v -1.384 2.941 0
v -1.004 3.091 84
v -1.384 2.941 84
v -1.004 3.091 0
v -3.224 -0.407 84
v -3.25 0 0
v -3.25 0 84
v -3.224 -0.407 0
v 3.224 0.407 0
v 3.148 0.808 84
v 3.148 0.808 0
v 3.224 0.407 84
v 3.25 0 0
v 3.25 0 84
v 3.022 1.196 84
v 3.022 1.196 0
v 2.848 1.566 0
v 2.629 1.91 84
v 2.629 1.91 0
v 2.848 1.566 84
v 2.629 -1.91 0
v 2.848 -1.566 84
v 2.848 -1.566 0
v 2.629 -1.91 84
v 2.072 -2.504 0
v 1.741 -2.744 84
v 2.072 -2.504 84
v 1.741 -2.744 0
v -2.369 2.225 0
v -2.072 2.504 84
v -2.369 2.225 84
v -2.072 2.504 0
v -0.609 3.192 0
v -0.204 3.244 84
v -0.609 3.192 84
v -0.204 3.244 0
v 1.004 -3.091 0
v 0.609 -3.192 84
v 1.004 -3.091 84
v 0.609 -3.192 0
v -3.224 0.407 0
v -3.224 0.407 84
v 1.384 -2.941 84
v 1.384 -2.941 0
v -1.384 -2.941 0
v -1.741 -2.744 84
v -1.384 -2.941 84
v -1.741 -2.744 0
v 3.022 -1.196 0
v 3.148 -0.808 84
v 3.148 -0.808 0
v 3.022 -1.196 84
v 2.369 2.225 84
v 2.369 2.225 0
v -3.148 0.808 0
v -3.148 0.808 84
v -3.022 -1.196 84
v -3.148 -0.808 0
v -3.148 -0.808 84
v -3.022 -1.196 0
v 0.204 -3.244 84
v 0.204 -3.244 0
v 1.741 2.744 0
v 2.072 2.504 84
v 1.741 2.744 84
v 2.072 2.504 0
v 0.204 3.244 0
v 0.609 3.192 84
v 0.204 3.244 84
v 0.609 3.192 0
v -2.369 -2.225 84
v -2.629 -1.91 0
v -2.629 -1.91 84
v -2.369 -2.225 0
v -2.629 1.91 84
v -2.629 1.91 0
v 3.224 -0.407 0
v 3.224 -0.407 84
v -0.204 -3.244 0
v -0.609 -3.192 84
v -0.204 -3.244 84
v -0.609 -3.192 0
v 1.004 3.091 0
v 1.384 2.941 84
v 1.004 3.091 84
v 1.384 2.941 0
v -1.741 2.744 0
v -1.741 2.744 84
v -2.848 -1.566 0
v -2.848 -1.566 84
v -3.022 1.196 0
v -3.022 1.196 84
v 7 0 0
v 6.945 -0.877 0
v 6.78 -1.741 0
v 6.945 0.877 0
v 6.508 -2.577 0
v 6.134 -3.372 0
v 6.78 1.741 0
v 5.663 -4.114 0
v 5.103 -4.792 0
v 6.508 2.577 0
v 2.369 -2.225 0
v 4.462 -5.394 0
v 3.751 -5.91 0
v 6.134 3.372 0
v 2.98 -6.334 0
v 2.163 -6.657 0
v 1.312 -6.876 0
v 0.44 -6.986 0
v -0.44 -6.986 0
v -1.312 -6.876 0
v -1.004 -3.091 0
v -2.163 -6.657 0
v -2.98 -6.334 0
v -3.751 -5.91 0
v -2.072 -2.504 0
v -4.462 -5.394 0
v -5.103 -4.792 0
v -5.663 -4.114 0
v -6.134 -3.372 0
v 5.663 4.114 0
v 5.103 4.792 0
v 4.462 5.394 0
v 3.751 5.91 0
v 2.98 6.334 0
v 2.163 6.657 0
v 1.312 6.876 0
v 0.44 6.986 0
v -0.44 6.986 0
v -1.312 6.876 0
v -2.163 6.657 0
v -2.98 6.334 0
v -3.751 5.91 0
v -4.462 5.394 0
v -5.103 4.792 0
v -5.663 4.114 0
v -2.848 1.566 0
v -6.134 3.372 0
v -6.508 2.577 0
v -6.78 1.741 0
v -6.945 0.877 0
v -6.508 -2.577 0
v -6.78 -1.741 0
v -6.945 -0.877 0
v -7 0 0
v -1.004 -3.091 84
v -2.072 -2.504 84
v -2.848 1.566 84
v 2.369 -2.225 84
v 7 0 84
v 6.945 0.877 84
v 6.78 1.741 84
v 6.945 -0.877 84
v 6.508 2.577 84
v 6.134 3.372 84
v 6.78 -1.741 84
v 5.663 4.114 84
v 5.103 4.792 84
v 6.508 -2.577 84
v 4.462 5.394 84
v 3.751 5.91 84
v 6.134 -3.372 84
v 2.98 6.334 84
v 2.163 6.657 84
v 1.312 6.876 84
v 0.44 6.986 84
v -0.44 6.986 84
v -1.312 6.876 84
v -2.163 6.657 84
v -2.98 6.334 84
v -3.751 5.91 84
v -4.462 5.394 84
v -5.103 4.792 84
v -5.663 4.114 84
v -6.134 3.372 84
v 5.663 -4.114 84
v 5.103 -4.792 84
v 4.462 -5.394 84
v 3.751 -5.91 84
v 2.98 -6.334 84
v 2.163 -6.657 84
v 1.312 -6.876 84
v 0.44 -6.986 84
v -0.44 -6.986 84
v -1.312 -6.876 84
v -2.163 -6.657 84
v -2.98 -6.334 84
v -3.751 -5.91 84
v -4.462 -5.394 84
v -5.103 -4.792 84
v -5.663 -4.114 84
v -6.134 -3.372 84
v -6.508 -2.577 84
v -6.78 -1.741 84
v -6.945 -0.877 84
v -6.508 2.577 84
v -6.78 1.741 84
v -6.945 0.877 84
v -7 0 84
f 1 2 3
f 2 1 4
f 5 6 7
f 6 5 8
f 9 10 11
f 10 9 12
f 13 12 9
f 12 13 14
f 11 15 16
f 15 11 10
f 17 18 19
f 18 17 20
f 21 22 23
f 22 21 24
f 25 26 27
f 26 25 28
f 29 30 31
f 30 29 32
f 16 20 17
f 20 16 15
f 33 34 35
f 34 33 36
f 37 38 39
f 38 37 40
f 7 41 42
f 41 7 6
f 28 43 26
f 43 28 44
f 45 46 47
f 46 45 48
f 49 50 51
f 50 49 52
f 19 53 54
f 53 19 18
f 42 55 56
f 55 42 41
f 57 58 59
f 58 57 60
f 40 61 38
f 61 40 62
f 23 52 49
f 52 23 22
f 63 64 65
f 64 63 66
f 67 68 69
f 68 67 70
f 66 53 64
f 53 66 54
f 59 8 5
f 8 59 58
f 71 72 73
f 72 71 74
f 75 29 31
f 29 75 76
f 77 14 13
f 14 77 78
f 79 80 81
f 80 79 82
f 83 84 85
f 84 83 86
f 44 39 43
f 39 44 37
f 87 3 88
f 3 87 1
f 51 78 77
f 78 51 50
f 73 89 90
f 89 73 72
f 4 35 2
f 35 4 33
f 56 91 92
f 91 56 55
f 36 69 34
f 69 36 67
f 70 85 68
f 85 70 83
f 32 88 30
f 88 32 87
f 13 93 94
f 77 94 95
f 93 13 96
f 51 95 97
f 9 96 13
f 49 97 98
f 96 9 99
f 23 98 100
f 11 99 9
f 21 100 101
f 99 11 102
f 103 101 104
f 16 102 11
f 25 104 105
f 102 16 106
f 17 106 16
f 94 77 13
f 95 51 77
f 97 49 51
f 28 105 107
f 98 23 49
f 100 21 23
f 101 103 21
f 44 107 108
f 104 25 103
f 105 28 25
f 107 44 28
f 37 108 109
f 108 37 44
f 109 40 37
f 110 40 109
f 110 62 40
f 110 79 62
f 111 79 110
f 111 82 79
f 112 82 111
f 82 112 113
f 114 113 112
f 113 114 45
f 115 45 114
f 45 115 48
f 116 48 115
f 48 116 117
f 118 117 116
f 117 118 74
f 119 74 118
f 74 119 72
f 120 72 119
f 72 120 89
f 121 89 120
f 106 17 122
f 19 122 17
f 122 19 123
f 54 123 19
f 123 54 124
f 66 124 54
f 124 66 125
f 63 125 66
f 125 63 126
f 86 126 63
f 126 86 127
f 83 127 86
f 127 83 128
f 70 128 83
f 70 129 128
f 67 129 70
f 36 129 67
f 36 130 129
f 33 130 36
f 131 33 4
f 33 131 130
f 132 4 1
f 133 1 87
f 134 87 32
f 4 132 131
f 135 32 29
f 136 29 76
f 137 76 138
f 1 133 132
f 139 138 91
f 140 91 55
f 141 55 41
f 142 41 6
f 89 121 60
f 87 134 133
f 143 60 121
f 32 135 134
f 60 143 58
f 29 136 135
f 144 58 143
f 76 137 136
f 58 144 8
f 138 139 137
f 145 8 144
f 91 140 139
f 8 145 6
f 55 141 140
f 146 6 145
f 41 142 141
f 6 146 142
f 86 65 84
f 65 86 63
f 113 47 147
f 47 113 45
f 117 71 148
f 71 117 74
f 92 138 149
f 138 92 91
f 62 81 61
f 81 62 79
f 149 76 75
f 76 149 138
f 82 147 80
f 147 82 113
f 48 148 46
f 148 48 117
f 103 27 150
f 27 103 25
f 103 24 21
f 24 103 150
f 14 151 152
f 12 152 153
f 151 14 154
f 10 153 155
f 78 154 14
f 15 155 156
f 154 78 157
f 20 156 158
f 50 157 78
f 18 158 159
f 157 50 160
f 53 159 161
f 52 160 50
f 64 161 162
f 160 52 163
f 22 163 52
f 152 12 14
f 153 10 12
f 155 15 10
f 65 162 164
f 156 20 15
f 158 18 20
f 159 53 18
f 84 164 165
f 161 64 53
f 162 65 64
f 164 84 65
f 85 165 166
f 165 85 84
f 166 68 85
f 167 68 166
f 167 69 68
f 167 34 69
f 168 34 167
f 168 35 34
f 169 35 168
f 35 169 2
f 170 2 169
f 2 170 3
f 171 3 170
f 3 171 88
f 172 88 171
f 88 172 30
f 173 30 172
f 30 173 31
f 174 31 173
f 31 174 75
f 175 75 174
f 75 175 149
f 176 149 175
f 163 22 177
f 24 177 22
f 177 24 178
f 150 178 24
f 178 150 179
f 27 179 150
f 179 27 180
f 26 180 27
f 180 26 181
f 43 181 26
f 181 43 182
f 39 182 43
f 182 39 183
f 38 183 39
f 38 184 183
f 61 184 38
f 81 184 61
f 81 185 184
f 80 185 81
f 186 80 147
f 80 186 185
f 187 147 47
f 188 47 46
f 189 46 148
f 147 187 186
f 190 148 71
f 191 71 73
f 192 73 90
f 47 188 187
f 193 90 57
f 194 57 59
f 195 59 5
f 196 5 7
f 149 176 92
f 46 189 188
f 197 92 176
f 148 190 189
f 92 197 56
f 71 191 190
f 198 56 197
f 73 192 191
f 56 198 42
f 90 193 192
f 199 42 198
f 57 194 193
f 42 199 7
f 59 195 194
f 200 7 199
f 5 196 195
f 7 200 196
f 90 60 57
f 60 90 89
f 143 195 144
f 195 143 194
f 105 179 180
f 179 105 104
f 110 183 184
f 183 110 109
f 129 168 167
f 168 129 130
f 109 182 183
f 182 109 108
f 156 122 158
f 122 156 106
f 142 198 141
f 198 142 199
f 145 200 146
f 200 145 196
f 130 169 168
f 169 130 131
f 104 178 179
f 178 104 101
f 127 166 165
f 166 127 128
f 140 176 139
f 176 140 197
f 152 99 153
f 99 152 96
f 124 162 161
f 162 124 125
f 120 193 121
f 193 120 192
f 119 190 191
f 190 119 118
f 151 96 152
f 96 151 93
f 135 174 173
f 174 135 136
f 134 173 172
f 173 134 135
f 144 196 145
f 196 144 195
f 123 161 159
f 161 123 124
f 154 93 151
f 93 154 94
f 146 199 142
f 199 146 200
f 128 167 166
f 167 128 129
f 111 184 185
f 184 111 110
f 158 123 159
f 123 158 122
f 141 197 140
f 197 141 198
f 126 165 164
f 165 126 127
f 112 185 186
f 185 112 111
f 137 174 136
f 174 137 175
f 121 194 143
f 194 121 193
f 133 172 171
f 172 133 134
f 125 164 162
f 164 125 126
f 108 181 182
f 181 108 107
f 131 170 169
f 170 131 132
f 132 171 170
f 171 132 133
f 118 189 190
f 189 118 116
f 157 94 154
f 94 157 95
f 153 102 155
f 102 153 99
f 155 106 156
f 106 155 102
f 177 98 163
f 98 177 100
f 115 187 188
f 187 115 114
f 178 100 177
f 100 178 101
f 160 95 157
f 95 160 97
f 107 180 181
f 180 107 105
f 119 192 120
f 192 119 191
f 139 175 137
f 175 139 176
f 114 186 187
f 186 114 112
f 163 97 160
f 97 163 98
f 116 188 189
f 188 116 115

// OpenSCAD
$fn = 50;


difference() {
	union() {
		cylinder(h = 84, r = 7.0000000000);
	}
	union() {
		cylinder(h = 84, r = 3.2500000000);
		cylinder(h = 84, r = 3.2500000000);
		cylinder(h = 84, r = 1.8000000000);
		cylinder(h = 84, r = 1.8000000000);
		cylinder(h = 84, r = 1.8000000000);
		cylinder(h = 84, r = 1.8000000000);
		cylinder(h = 84, r = 1.8000000000);
		cylinder(h = 84, r = 1.8000000000);
	}
}
